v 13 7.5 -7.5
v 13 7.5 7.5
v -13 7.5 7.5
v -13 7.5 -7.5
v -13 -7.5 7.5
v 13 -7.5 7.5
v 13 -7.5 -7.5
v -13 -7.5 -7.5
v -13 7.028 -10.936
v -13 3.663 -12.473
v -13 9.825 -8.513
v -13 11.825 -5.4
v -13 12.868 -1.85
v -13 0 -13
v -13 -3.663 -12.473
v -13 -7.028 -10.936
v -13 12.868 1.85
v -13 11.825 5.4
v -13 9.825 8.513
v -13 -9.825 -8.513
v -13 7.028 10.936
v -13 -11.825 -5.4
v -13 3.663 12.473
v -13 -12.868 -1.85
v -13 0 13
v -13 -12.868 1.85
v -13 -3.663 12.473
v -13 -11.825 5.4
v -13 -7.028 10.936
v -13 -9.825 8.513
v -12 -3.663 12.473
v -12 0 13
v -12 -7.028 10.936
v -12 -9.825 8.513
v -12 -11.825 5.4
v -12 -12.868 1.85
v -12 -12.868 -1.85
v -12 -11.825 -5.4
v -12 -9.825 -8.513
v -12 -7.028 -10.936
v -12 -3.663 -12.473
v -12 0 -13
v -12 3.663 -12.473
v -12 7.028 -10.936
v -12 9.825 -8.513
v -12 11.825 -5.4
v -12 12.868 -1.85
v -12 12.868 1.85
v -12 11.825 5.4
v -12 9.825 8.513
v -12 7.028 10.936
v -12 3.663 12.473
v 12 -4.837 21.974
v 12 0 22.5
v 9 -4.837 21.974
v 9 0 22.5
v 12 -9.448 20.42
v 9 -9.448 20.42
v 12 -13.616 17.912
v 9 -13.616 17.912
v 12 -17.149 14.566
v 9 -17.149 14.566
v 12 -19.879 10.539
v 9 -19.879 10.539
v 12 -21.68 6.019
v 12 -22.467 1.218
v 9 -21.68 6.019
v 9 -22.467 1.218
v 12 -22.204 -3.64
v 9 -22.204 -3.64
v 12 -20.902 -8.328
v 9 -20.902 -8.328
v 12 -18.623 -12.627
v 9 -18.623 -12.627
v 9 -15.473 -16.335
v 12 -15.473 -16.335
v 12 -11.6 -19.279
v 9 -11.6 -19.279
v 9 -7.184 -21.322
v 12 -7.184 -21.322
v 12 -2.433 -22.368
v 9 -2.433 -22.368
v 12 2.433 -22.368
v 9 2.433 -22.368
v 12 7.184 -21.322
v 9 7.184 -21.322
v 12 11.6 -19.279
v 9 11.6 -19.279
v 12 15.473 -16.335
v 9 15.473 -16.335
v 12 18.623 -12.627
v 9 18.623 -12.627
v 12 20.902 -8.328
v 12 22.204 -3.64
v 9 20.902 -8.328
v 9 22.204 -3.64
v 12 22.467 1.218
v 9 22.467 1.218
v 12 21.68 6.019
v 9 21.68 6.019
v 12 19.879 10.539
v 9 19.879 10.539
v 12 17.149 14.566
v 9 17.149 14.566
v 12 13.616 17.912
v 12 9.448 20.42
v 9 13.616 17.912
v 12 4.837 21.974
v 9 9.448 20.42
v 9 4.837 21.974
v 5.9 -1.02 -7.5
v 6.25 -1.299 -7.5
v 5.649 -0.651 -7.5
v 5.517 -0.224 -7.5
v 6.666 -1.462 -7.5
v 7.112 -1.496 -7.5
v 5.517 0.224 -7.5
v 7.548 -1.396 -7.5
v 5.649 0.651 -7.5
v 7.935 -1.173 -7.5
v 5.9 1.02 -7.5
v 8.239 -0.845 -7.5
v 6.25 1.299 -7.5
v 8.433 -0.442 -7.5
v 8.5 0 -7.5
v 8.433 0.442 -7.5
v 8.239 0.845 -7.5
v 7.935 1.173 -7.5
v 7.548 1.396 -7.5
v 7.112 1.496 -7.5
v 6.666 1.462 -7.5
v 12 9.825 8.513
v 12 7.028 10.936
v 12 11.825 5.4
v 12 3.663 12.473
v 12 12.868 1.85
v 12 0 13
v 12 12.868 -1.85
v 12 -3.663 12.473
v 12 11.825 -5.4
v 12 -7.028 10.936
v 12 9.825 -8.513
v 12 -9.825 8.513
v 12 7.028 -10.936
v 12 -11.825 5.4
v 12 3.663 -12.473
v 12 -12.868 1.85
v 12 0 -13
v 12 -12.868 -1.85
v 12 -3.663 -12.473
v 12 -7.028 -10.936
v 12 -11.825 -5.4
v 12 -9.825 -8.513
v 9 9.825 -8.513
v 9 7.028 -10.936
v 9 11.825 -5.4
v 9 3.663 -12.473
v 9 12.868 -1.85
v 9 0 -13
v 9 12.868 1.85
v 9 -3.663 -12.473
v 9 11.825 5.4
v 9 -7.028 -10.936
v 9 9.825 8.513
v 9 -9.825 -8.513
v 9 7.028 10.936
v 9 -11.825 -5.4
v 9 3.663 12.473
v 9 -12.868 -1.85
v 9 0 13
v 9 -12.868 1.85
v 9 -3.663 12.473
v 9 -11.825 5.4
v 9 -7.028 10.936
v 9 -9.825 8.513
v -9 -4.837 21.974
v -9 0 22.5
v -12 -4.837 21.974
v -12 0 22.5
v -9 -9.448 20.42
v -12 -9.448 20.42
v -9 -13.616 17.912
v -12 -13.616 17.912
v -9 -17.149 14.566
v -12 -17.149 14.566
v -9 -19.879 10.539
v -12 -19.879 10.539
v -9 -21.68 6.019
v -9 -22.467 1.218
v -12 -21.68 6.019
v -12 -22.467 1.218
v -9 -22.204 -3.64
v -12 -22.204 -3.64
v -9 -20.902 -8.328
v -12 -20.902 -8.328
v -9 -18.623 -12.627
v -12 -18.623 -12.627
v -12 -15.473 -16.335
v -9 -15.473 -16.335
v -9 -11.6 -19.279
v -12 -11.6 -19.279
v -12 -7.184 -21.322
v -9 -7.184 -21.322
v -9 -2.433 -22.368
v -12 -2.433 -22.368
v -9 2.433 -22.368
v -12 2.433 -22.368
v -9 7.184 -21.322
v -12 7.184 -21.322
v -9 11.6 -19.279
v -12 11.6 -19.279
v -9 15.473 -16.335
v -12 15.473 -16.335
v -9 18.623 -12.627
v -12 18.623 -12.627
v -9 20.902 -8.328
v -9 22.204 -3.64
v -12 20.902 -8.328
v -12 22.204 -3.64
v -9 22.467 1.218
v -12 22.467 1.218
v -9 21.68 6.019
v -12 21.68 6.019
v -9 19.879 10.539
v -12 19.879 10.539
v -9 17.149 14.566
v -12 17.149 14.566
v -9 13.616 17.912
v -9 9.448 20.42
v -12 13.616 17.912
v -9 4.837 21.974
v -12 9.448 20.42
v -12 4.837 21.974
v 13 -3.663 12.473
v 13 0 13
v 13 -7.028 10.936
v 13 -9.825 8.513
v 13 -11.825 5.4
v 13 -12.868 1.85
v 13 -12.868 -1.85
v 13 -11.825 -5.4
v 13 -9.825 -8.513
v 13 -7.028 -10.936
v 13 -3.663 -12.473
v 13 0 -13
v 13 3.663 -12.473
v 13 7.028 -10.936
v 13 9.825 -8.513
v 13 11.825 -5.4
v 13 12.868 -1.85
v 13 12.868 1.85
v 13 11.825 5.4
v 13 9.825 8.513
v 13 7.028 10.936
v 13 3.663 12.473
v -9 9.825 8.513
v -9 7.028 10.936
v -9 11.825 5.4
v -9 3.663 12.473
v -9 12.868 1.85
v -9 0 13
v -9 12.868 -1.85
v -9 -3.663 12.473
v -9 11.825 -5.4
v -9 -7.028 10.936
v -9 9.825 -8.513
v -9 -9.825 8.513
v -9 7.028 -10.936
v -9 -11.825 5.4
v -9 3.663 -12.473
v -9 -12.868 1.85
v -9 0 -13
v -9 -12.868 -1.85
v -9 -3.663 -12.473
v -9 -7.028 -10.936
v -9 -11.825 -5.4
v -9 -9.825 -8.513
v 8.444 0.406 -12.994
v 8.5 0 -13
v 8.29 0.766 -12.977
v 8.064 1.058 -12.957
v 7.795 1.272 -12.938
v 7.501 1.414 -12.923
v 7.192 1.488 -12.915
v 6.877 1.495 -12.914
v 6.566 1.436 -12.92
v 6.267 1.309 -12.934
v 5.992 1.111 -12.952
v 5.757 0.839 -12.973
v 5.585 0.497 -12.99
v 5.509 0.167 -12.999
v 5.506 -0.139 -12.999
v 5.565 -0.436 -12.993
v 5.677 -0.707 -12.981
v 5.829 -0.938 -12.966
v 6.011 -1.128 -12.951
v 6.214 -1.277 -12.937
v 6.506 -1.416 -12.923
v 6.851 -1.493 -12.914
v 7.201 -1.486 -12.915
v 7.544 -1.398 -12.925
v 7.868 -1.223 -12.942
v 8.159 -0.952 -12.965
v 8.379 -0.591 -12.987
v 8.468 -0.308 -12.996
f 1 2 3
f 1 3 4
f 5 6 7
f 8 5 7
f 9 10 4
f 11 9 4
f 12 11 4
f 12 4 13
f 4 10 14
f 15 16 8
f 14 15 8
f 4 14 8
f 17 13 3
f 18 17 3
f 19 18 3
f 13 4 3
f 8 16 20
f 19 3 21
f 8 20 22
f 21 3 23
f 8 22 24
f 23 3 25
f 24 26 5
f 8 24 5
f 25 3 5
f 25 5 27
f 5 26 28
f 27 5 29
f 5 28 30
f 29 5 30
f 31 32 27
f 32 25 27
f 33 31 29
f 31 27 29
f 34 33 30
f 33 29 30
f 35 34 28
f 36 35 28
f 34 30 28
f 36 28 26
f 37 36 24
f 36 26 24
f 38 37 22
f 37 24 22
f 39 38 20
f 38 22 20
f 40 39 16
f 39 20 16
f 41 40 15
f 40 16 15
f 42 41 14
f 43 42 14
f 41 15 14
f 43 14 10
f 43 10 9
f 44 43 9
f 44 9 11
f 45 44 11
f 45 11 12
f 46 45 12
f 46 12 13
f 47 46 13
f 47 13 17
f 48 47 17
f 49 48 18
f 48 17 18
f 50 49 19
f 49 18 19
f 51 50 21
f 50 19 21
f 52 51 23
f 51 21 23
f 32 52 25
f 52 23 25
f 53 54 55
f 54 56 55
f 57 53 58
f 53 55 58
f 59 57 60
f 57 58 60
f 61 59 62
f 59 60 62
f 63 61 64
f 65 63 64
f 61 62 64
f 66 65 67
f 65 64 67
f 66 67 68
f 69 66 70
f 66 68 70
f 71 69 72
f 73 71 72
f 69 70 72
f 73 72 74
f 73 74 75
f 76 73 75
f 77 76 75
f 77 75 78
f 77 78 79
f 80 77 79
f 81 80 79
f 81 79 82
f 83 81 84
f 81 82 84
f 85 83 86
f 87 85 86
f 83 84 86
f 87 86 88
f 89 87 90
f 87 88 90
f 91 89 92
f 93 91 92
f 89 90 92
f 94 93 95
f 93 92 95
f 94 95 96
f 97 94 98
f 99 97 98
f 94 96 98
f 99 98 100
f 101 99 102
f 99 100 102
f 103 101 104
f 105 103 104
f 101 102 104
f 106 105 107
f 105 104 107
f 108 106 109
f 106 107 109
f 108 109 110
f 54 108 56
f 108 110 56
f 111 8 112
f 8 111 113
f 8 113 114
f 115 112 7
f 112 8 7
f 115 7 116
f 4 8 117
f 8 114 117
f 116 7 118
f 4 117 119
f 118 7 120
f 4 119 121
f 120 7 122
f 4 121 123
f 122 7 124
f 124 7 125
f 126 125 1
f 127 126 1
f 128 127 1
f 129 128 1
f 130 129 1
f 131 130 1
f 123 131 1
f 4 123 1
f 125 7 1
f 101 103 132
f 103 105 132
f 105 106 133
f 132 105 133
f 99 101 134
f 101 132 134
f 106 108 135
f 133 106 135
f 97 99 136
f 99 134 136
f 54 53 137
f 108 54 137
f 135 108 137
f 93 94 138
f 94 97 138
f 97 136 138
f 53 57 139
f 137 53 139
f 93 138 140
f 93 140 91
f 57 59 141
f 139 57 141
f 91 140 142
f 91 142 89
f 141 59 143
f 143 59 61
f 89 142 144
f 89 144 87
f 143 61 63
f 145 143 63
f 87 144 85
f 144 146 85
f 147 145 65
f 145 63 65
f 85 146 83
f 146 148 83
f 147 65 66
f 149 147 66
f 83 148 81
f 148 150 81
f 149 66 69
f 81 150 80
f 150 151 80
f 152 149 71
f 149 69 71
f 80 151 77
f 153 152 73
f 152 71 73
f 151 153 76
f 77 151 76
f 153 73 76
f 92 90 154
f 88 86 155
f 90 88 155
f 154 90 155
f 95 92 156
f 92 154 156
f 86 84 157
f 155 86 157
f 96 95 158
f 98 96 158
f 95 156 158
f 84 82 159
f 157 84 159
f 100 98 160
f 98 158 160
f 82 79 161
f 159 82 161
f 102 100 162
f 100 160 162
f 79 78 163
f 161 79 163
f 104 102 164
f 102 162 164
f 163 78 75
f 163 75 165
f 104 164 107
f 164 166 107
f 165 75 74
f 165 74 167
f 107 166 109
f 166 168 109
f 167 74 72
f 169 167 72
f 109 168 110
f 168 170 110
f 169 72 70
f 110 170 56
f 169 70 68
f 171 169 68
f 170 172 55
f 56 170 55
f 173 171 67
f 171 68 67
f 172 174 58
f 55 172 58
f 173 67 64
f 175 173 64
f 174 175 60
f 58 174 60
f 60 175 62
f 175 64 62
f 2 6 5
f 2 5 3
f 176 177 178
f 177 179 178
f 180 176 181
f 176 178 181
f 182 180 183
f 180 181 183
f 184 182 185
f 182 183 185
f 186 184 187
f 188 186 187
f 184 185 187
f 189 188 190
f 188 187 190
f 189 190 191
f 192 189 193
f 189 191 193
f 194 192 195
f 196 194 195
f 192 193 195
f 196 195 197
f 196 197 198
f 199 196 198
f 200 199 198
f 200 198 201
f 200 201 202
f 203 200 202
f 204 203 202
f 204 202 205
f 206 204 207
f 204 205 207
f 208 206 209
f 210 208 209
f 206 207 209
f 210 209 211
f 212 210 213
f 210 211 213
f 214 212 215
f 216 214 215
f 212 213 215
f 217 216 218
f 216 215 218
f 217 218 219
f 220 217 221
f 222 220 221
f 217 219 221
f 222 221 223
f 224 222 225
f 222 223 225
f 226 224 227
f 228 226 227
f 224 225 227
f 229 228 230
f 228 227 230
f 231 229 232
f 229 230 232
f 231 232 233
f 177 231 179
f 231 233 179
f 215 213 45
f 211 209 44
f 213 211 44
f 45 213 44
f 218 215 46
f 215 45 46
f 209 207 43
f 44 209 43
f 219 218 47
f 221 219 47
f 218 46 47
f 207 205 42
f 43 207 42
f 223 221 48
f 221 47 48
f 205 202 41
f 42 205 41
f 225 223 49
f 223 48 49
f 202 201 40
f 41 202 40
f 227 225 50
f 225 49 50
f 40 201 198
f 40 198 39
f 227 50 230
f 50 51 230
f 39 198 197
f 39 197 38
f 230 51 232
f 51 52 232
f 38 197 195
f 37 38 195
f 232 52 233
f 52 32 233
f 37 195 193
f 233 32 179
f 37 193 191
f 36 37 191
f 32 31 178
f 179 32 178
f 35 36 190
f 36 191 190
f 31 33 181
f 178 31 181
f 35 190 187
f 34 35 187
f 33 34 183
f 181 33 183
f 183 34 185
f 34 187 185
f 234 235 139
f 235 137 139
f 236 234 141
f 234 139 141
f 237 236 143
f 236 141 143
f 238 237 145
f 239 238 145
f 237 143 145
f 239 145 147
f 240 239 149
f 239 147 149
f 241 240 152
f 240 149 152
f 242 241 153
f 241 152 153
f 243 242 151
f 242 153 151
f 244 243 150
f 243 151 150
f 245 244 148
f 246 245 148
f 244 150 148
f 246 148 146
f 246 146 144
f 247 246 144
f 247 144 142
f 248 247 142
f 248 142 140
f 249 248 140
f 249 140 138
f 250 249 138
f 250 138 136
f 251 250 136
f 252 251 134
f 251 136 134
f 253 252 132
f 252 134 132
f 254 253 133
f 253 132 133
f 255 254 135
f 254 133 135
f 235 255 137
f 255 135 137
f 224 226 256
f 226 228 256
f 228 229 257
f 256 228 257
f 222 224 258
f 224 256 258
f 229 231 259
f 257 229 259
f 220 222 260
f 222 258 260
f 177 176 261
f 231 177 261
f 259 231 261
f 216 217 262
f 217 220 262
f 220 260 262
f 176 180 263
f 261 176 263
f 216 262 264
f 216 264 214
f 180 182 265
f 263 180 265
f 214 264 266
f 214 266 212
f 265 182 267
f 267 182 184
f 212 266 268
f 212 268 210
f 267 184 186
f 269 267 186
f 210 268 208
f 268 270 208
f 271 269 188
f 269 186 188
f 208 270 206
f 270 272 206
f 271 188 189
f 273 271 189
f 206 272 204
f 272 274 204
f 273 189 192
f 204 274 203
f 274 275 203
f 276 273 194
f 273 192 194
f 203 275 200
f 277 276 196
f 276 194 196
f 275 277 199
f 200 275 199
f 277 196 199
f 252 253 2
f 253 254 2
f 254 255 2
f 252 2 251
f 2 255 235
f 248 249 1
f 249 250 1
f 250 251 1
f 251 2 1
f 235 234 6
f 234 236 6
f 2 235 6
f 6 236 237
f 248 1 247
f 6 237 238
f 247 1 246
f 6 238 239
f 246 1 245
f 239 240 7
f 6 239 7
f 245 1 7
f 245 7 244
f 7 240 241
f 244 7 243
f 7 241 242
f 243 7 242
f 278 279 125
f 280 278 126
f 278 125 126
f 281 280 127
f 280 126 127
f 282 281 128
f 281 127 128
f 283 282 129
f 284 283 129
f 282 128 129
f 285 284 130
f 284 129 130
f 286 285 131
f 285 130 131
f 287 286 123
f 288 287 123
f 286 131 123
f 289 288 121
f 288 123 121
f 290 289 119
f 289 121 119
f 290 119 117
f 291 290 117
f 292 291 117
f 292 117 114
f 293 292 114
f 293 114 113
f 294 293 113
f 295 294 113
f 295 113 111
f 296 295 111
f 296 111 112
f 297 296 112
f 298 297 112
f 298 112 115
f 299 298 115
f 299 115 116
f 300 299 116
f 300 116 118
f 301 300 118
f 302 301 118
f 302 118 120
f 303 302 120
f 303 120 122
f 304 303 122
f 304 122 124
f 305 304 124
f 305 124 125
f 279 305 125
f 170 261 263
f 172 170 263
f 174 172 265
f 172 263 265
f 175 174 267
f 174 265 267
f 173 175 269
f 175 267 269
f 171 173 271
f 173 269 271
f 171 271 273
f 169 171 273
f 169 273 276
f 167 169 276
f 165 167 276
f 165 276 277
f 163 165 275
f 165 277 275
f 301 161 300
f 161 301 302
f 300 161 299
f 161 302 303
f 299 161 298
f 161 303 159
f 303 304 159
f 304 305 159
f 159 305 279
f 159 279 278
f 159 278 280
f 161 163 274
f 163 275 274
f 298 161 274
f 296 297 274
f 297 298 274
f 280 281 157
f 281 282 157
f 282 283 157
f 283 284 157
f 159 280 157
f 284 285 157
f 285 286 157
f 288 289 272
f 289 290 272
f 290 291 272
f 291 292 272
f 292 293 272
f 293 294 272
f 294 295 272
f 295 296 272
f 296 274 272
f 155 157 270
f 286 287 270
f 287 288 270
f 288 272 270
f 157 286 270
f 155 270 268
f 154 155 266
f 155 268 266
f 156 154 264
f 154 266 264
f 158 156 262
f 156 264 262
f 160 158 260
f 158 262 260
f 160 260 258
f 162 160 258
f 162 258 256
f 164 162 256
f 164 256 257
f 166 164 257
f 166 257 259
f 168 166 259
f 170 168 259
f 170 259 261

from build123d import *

# Parameters (mm, degrees)
SKETCH2_W          = 15
SKETCH2_H          = 15
CUT_EXTRUDE1_DEPTH = 42.091361623
SKETCH3_R          = 1.5
CUT_EXTRUDE2_DEPTH = 35.372954485


with BuildPart() as part:
    # Sketch1 → Revolve1 (revolve)
    with BuildSketch(Plane.XY, mode=Mode.PRIVATE) as revolve1_sk:
        Polygon((-13, 7.5), (13, 7.5), (13, 13), (12, 13), (12, 22.5), (9, 22.5), (9, 13), (-9, 13), (-9, 22.5), (-12, 22.5), (-12, 13), (-13, 13), align=None)
    revolve(revolve1_sk.sketch.rotate(Axis((0, 0, 0), (1, 0, 0)), 90), axis=Axis((0, 0, 0), (1, 0, 0)))

    # Sketch2 → Cut-Extrude1 (cut, through all)
    with BuildSketch(Plane(origin=(13, 0, 0), x_dir=(0, 0, -1), z_dir=(1, 0, 0))):
        Rectangle(SKETCH2_W, SKETCH2_H)
    extrude(amount=-CUT_EXTRUDE1_DEPTH, mode=Mode.SUBTRACT)

    # Sketch3 → Cut-Extrude2 (cut, through all)
    with BuildSketch(Plane.XY):
        with Locations((7, 0)):
            Circle(SKETCH3_R)
    extrude(amount=-CUT_EXTRUDE2_DEPTH, mode=Mode.SUBTRACT)


solid = part.part
